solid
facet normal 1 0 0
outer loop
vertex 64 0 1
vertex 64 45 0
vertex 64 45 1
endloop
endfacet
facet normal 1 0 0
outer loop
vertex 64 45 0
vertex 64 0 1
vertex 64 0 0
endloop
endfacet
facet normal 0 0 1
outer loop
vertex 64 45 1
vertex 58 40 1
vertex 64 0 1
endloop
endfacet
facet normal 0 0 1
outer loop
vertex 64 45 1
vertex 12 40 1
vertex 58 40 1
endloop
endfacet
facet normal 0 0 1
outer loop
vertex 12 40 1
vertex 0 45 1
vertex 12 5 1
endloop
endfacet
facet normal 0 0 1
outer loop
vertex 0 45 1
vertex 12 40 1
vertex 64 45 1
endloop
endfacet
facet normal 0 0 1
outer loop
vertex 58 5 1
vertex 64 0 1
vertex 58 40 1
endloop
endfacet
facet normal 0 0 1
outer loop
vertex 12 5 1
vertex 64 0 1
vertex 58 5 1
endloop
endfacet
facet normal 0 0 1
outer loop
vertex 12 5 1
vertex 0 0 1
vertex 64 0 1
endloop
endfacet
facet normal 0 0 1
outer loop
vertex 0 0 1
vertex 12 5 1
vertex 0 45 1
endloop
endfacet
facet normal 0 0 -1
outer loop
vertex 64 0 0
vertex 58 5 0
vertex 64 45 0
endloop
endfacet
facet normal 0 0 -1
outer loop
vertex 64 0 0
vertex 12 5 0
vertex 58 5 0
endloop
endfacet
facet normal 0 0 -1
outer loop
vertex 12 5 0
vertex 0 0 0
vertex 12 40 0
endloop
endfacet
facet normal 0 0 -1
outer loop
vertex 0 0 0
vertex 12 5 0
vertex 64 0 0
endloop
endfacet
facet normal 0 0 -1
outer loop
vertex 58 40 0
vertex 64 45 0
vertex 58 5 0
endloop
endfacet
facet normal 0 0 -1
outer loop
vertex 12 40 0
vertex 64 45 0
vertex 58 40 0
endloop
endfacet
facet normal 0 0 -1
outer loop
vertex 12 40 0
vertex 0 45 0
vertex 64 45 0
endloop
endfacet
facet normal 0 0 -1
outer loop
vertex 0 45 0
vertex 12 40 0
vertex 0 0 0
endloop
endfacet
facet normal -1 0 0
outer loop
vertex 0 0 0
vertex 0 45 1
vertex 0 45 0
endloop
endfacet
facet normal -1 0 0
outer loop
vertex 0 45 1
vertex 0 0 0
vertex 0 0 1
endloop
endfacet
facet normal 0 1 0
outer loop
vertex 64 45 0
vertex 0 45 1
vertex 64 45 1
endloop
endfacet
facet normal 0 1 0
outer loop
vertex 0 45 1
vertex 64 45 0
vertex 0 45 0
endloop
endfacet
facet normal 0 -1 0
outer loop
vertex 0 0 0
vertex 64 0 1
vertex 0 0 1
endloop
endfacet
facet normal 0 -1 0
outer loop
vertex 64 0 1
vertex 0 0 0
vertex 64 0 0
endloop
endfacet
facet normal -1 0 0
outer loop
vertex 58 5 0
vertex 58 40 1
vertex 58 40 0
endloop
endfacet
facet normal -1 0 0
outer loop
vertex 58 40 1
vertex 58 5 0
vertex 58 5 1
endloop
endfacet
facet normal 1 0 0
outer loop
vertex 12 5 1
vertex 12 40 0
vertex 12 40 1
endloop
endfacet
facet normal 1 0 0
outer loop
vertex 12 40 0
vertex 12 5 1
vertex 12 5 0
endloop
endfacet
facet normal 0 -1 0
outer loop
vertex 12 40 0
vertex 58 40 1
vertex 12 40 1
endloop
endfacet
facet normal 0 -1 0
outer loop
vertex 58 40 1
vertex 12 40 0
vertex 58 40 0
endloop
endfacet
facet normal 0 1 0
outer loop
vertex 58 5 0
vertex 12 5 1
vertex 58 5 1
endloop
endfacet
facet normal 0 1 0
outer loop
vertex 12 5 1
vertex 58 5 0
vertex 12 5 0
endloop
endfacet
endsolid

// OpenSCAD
$fa = 1;
$fs = 0.4;


difference() {
   cube([64, 45, 1]);
   translate([12, 5, -1]) cube([46, 35, 3]);
   
}
